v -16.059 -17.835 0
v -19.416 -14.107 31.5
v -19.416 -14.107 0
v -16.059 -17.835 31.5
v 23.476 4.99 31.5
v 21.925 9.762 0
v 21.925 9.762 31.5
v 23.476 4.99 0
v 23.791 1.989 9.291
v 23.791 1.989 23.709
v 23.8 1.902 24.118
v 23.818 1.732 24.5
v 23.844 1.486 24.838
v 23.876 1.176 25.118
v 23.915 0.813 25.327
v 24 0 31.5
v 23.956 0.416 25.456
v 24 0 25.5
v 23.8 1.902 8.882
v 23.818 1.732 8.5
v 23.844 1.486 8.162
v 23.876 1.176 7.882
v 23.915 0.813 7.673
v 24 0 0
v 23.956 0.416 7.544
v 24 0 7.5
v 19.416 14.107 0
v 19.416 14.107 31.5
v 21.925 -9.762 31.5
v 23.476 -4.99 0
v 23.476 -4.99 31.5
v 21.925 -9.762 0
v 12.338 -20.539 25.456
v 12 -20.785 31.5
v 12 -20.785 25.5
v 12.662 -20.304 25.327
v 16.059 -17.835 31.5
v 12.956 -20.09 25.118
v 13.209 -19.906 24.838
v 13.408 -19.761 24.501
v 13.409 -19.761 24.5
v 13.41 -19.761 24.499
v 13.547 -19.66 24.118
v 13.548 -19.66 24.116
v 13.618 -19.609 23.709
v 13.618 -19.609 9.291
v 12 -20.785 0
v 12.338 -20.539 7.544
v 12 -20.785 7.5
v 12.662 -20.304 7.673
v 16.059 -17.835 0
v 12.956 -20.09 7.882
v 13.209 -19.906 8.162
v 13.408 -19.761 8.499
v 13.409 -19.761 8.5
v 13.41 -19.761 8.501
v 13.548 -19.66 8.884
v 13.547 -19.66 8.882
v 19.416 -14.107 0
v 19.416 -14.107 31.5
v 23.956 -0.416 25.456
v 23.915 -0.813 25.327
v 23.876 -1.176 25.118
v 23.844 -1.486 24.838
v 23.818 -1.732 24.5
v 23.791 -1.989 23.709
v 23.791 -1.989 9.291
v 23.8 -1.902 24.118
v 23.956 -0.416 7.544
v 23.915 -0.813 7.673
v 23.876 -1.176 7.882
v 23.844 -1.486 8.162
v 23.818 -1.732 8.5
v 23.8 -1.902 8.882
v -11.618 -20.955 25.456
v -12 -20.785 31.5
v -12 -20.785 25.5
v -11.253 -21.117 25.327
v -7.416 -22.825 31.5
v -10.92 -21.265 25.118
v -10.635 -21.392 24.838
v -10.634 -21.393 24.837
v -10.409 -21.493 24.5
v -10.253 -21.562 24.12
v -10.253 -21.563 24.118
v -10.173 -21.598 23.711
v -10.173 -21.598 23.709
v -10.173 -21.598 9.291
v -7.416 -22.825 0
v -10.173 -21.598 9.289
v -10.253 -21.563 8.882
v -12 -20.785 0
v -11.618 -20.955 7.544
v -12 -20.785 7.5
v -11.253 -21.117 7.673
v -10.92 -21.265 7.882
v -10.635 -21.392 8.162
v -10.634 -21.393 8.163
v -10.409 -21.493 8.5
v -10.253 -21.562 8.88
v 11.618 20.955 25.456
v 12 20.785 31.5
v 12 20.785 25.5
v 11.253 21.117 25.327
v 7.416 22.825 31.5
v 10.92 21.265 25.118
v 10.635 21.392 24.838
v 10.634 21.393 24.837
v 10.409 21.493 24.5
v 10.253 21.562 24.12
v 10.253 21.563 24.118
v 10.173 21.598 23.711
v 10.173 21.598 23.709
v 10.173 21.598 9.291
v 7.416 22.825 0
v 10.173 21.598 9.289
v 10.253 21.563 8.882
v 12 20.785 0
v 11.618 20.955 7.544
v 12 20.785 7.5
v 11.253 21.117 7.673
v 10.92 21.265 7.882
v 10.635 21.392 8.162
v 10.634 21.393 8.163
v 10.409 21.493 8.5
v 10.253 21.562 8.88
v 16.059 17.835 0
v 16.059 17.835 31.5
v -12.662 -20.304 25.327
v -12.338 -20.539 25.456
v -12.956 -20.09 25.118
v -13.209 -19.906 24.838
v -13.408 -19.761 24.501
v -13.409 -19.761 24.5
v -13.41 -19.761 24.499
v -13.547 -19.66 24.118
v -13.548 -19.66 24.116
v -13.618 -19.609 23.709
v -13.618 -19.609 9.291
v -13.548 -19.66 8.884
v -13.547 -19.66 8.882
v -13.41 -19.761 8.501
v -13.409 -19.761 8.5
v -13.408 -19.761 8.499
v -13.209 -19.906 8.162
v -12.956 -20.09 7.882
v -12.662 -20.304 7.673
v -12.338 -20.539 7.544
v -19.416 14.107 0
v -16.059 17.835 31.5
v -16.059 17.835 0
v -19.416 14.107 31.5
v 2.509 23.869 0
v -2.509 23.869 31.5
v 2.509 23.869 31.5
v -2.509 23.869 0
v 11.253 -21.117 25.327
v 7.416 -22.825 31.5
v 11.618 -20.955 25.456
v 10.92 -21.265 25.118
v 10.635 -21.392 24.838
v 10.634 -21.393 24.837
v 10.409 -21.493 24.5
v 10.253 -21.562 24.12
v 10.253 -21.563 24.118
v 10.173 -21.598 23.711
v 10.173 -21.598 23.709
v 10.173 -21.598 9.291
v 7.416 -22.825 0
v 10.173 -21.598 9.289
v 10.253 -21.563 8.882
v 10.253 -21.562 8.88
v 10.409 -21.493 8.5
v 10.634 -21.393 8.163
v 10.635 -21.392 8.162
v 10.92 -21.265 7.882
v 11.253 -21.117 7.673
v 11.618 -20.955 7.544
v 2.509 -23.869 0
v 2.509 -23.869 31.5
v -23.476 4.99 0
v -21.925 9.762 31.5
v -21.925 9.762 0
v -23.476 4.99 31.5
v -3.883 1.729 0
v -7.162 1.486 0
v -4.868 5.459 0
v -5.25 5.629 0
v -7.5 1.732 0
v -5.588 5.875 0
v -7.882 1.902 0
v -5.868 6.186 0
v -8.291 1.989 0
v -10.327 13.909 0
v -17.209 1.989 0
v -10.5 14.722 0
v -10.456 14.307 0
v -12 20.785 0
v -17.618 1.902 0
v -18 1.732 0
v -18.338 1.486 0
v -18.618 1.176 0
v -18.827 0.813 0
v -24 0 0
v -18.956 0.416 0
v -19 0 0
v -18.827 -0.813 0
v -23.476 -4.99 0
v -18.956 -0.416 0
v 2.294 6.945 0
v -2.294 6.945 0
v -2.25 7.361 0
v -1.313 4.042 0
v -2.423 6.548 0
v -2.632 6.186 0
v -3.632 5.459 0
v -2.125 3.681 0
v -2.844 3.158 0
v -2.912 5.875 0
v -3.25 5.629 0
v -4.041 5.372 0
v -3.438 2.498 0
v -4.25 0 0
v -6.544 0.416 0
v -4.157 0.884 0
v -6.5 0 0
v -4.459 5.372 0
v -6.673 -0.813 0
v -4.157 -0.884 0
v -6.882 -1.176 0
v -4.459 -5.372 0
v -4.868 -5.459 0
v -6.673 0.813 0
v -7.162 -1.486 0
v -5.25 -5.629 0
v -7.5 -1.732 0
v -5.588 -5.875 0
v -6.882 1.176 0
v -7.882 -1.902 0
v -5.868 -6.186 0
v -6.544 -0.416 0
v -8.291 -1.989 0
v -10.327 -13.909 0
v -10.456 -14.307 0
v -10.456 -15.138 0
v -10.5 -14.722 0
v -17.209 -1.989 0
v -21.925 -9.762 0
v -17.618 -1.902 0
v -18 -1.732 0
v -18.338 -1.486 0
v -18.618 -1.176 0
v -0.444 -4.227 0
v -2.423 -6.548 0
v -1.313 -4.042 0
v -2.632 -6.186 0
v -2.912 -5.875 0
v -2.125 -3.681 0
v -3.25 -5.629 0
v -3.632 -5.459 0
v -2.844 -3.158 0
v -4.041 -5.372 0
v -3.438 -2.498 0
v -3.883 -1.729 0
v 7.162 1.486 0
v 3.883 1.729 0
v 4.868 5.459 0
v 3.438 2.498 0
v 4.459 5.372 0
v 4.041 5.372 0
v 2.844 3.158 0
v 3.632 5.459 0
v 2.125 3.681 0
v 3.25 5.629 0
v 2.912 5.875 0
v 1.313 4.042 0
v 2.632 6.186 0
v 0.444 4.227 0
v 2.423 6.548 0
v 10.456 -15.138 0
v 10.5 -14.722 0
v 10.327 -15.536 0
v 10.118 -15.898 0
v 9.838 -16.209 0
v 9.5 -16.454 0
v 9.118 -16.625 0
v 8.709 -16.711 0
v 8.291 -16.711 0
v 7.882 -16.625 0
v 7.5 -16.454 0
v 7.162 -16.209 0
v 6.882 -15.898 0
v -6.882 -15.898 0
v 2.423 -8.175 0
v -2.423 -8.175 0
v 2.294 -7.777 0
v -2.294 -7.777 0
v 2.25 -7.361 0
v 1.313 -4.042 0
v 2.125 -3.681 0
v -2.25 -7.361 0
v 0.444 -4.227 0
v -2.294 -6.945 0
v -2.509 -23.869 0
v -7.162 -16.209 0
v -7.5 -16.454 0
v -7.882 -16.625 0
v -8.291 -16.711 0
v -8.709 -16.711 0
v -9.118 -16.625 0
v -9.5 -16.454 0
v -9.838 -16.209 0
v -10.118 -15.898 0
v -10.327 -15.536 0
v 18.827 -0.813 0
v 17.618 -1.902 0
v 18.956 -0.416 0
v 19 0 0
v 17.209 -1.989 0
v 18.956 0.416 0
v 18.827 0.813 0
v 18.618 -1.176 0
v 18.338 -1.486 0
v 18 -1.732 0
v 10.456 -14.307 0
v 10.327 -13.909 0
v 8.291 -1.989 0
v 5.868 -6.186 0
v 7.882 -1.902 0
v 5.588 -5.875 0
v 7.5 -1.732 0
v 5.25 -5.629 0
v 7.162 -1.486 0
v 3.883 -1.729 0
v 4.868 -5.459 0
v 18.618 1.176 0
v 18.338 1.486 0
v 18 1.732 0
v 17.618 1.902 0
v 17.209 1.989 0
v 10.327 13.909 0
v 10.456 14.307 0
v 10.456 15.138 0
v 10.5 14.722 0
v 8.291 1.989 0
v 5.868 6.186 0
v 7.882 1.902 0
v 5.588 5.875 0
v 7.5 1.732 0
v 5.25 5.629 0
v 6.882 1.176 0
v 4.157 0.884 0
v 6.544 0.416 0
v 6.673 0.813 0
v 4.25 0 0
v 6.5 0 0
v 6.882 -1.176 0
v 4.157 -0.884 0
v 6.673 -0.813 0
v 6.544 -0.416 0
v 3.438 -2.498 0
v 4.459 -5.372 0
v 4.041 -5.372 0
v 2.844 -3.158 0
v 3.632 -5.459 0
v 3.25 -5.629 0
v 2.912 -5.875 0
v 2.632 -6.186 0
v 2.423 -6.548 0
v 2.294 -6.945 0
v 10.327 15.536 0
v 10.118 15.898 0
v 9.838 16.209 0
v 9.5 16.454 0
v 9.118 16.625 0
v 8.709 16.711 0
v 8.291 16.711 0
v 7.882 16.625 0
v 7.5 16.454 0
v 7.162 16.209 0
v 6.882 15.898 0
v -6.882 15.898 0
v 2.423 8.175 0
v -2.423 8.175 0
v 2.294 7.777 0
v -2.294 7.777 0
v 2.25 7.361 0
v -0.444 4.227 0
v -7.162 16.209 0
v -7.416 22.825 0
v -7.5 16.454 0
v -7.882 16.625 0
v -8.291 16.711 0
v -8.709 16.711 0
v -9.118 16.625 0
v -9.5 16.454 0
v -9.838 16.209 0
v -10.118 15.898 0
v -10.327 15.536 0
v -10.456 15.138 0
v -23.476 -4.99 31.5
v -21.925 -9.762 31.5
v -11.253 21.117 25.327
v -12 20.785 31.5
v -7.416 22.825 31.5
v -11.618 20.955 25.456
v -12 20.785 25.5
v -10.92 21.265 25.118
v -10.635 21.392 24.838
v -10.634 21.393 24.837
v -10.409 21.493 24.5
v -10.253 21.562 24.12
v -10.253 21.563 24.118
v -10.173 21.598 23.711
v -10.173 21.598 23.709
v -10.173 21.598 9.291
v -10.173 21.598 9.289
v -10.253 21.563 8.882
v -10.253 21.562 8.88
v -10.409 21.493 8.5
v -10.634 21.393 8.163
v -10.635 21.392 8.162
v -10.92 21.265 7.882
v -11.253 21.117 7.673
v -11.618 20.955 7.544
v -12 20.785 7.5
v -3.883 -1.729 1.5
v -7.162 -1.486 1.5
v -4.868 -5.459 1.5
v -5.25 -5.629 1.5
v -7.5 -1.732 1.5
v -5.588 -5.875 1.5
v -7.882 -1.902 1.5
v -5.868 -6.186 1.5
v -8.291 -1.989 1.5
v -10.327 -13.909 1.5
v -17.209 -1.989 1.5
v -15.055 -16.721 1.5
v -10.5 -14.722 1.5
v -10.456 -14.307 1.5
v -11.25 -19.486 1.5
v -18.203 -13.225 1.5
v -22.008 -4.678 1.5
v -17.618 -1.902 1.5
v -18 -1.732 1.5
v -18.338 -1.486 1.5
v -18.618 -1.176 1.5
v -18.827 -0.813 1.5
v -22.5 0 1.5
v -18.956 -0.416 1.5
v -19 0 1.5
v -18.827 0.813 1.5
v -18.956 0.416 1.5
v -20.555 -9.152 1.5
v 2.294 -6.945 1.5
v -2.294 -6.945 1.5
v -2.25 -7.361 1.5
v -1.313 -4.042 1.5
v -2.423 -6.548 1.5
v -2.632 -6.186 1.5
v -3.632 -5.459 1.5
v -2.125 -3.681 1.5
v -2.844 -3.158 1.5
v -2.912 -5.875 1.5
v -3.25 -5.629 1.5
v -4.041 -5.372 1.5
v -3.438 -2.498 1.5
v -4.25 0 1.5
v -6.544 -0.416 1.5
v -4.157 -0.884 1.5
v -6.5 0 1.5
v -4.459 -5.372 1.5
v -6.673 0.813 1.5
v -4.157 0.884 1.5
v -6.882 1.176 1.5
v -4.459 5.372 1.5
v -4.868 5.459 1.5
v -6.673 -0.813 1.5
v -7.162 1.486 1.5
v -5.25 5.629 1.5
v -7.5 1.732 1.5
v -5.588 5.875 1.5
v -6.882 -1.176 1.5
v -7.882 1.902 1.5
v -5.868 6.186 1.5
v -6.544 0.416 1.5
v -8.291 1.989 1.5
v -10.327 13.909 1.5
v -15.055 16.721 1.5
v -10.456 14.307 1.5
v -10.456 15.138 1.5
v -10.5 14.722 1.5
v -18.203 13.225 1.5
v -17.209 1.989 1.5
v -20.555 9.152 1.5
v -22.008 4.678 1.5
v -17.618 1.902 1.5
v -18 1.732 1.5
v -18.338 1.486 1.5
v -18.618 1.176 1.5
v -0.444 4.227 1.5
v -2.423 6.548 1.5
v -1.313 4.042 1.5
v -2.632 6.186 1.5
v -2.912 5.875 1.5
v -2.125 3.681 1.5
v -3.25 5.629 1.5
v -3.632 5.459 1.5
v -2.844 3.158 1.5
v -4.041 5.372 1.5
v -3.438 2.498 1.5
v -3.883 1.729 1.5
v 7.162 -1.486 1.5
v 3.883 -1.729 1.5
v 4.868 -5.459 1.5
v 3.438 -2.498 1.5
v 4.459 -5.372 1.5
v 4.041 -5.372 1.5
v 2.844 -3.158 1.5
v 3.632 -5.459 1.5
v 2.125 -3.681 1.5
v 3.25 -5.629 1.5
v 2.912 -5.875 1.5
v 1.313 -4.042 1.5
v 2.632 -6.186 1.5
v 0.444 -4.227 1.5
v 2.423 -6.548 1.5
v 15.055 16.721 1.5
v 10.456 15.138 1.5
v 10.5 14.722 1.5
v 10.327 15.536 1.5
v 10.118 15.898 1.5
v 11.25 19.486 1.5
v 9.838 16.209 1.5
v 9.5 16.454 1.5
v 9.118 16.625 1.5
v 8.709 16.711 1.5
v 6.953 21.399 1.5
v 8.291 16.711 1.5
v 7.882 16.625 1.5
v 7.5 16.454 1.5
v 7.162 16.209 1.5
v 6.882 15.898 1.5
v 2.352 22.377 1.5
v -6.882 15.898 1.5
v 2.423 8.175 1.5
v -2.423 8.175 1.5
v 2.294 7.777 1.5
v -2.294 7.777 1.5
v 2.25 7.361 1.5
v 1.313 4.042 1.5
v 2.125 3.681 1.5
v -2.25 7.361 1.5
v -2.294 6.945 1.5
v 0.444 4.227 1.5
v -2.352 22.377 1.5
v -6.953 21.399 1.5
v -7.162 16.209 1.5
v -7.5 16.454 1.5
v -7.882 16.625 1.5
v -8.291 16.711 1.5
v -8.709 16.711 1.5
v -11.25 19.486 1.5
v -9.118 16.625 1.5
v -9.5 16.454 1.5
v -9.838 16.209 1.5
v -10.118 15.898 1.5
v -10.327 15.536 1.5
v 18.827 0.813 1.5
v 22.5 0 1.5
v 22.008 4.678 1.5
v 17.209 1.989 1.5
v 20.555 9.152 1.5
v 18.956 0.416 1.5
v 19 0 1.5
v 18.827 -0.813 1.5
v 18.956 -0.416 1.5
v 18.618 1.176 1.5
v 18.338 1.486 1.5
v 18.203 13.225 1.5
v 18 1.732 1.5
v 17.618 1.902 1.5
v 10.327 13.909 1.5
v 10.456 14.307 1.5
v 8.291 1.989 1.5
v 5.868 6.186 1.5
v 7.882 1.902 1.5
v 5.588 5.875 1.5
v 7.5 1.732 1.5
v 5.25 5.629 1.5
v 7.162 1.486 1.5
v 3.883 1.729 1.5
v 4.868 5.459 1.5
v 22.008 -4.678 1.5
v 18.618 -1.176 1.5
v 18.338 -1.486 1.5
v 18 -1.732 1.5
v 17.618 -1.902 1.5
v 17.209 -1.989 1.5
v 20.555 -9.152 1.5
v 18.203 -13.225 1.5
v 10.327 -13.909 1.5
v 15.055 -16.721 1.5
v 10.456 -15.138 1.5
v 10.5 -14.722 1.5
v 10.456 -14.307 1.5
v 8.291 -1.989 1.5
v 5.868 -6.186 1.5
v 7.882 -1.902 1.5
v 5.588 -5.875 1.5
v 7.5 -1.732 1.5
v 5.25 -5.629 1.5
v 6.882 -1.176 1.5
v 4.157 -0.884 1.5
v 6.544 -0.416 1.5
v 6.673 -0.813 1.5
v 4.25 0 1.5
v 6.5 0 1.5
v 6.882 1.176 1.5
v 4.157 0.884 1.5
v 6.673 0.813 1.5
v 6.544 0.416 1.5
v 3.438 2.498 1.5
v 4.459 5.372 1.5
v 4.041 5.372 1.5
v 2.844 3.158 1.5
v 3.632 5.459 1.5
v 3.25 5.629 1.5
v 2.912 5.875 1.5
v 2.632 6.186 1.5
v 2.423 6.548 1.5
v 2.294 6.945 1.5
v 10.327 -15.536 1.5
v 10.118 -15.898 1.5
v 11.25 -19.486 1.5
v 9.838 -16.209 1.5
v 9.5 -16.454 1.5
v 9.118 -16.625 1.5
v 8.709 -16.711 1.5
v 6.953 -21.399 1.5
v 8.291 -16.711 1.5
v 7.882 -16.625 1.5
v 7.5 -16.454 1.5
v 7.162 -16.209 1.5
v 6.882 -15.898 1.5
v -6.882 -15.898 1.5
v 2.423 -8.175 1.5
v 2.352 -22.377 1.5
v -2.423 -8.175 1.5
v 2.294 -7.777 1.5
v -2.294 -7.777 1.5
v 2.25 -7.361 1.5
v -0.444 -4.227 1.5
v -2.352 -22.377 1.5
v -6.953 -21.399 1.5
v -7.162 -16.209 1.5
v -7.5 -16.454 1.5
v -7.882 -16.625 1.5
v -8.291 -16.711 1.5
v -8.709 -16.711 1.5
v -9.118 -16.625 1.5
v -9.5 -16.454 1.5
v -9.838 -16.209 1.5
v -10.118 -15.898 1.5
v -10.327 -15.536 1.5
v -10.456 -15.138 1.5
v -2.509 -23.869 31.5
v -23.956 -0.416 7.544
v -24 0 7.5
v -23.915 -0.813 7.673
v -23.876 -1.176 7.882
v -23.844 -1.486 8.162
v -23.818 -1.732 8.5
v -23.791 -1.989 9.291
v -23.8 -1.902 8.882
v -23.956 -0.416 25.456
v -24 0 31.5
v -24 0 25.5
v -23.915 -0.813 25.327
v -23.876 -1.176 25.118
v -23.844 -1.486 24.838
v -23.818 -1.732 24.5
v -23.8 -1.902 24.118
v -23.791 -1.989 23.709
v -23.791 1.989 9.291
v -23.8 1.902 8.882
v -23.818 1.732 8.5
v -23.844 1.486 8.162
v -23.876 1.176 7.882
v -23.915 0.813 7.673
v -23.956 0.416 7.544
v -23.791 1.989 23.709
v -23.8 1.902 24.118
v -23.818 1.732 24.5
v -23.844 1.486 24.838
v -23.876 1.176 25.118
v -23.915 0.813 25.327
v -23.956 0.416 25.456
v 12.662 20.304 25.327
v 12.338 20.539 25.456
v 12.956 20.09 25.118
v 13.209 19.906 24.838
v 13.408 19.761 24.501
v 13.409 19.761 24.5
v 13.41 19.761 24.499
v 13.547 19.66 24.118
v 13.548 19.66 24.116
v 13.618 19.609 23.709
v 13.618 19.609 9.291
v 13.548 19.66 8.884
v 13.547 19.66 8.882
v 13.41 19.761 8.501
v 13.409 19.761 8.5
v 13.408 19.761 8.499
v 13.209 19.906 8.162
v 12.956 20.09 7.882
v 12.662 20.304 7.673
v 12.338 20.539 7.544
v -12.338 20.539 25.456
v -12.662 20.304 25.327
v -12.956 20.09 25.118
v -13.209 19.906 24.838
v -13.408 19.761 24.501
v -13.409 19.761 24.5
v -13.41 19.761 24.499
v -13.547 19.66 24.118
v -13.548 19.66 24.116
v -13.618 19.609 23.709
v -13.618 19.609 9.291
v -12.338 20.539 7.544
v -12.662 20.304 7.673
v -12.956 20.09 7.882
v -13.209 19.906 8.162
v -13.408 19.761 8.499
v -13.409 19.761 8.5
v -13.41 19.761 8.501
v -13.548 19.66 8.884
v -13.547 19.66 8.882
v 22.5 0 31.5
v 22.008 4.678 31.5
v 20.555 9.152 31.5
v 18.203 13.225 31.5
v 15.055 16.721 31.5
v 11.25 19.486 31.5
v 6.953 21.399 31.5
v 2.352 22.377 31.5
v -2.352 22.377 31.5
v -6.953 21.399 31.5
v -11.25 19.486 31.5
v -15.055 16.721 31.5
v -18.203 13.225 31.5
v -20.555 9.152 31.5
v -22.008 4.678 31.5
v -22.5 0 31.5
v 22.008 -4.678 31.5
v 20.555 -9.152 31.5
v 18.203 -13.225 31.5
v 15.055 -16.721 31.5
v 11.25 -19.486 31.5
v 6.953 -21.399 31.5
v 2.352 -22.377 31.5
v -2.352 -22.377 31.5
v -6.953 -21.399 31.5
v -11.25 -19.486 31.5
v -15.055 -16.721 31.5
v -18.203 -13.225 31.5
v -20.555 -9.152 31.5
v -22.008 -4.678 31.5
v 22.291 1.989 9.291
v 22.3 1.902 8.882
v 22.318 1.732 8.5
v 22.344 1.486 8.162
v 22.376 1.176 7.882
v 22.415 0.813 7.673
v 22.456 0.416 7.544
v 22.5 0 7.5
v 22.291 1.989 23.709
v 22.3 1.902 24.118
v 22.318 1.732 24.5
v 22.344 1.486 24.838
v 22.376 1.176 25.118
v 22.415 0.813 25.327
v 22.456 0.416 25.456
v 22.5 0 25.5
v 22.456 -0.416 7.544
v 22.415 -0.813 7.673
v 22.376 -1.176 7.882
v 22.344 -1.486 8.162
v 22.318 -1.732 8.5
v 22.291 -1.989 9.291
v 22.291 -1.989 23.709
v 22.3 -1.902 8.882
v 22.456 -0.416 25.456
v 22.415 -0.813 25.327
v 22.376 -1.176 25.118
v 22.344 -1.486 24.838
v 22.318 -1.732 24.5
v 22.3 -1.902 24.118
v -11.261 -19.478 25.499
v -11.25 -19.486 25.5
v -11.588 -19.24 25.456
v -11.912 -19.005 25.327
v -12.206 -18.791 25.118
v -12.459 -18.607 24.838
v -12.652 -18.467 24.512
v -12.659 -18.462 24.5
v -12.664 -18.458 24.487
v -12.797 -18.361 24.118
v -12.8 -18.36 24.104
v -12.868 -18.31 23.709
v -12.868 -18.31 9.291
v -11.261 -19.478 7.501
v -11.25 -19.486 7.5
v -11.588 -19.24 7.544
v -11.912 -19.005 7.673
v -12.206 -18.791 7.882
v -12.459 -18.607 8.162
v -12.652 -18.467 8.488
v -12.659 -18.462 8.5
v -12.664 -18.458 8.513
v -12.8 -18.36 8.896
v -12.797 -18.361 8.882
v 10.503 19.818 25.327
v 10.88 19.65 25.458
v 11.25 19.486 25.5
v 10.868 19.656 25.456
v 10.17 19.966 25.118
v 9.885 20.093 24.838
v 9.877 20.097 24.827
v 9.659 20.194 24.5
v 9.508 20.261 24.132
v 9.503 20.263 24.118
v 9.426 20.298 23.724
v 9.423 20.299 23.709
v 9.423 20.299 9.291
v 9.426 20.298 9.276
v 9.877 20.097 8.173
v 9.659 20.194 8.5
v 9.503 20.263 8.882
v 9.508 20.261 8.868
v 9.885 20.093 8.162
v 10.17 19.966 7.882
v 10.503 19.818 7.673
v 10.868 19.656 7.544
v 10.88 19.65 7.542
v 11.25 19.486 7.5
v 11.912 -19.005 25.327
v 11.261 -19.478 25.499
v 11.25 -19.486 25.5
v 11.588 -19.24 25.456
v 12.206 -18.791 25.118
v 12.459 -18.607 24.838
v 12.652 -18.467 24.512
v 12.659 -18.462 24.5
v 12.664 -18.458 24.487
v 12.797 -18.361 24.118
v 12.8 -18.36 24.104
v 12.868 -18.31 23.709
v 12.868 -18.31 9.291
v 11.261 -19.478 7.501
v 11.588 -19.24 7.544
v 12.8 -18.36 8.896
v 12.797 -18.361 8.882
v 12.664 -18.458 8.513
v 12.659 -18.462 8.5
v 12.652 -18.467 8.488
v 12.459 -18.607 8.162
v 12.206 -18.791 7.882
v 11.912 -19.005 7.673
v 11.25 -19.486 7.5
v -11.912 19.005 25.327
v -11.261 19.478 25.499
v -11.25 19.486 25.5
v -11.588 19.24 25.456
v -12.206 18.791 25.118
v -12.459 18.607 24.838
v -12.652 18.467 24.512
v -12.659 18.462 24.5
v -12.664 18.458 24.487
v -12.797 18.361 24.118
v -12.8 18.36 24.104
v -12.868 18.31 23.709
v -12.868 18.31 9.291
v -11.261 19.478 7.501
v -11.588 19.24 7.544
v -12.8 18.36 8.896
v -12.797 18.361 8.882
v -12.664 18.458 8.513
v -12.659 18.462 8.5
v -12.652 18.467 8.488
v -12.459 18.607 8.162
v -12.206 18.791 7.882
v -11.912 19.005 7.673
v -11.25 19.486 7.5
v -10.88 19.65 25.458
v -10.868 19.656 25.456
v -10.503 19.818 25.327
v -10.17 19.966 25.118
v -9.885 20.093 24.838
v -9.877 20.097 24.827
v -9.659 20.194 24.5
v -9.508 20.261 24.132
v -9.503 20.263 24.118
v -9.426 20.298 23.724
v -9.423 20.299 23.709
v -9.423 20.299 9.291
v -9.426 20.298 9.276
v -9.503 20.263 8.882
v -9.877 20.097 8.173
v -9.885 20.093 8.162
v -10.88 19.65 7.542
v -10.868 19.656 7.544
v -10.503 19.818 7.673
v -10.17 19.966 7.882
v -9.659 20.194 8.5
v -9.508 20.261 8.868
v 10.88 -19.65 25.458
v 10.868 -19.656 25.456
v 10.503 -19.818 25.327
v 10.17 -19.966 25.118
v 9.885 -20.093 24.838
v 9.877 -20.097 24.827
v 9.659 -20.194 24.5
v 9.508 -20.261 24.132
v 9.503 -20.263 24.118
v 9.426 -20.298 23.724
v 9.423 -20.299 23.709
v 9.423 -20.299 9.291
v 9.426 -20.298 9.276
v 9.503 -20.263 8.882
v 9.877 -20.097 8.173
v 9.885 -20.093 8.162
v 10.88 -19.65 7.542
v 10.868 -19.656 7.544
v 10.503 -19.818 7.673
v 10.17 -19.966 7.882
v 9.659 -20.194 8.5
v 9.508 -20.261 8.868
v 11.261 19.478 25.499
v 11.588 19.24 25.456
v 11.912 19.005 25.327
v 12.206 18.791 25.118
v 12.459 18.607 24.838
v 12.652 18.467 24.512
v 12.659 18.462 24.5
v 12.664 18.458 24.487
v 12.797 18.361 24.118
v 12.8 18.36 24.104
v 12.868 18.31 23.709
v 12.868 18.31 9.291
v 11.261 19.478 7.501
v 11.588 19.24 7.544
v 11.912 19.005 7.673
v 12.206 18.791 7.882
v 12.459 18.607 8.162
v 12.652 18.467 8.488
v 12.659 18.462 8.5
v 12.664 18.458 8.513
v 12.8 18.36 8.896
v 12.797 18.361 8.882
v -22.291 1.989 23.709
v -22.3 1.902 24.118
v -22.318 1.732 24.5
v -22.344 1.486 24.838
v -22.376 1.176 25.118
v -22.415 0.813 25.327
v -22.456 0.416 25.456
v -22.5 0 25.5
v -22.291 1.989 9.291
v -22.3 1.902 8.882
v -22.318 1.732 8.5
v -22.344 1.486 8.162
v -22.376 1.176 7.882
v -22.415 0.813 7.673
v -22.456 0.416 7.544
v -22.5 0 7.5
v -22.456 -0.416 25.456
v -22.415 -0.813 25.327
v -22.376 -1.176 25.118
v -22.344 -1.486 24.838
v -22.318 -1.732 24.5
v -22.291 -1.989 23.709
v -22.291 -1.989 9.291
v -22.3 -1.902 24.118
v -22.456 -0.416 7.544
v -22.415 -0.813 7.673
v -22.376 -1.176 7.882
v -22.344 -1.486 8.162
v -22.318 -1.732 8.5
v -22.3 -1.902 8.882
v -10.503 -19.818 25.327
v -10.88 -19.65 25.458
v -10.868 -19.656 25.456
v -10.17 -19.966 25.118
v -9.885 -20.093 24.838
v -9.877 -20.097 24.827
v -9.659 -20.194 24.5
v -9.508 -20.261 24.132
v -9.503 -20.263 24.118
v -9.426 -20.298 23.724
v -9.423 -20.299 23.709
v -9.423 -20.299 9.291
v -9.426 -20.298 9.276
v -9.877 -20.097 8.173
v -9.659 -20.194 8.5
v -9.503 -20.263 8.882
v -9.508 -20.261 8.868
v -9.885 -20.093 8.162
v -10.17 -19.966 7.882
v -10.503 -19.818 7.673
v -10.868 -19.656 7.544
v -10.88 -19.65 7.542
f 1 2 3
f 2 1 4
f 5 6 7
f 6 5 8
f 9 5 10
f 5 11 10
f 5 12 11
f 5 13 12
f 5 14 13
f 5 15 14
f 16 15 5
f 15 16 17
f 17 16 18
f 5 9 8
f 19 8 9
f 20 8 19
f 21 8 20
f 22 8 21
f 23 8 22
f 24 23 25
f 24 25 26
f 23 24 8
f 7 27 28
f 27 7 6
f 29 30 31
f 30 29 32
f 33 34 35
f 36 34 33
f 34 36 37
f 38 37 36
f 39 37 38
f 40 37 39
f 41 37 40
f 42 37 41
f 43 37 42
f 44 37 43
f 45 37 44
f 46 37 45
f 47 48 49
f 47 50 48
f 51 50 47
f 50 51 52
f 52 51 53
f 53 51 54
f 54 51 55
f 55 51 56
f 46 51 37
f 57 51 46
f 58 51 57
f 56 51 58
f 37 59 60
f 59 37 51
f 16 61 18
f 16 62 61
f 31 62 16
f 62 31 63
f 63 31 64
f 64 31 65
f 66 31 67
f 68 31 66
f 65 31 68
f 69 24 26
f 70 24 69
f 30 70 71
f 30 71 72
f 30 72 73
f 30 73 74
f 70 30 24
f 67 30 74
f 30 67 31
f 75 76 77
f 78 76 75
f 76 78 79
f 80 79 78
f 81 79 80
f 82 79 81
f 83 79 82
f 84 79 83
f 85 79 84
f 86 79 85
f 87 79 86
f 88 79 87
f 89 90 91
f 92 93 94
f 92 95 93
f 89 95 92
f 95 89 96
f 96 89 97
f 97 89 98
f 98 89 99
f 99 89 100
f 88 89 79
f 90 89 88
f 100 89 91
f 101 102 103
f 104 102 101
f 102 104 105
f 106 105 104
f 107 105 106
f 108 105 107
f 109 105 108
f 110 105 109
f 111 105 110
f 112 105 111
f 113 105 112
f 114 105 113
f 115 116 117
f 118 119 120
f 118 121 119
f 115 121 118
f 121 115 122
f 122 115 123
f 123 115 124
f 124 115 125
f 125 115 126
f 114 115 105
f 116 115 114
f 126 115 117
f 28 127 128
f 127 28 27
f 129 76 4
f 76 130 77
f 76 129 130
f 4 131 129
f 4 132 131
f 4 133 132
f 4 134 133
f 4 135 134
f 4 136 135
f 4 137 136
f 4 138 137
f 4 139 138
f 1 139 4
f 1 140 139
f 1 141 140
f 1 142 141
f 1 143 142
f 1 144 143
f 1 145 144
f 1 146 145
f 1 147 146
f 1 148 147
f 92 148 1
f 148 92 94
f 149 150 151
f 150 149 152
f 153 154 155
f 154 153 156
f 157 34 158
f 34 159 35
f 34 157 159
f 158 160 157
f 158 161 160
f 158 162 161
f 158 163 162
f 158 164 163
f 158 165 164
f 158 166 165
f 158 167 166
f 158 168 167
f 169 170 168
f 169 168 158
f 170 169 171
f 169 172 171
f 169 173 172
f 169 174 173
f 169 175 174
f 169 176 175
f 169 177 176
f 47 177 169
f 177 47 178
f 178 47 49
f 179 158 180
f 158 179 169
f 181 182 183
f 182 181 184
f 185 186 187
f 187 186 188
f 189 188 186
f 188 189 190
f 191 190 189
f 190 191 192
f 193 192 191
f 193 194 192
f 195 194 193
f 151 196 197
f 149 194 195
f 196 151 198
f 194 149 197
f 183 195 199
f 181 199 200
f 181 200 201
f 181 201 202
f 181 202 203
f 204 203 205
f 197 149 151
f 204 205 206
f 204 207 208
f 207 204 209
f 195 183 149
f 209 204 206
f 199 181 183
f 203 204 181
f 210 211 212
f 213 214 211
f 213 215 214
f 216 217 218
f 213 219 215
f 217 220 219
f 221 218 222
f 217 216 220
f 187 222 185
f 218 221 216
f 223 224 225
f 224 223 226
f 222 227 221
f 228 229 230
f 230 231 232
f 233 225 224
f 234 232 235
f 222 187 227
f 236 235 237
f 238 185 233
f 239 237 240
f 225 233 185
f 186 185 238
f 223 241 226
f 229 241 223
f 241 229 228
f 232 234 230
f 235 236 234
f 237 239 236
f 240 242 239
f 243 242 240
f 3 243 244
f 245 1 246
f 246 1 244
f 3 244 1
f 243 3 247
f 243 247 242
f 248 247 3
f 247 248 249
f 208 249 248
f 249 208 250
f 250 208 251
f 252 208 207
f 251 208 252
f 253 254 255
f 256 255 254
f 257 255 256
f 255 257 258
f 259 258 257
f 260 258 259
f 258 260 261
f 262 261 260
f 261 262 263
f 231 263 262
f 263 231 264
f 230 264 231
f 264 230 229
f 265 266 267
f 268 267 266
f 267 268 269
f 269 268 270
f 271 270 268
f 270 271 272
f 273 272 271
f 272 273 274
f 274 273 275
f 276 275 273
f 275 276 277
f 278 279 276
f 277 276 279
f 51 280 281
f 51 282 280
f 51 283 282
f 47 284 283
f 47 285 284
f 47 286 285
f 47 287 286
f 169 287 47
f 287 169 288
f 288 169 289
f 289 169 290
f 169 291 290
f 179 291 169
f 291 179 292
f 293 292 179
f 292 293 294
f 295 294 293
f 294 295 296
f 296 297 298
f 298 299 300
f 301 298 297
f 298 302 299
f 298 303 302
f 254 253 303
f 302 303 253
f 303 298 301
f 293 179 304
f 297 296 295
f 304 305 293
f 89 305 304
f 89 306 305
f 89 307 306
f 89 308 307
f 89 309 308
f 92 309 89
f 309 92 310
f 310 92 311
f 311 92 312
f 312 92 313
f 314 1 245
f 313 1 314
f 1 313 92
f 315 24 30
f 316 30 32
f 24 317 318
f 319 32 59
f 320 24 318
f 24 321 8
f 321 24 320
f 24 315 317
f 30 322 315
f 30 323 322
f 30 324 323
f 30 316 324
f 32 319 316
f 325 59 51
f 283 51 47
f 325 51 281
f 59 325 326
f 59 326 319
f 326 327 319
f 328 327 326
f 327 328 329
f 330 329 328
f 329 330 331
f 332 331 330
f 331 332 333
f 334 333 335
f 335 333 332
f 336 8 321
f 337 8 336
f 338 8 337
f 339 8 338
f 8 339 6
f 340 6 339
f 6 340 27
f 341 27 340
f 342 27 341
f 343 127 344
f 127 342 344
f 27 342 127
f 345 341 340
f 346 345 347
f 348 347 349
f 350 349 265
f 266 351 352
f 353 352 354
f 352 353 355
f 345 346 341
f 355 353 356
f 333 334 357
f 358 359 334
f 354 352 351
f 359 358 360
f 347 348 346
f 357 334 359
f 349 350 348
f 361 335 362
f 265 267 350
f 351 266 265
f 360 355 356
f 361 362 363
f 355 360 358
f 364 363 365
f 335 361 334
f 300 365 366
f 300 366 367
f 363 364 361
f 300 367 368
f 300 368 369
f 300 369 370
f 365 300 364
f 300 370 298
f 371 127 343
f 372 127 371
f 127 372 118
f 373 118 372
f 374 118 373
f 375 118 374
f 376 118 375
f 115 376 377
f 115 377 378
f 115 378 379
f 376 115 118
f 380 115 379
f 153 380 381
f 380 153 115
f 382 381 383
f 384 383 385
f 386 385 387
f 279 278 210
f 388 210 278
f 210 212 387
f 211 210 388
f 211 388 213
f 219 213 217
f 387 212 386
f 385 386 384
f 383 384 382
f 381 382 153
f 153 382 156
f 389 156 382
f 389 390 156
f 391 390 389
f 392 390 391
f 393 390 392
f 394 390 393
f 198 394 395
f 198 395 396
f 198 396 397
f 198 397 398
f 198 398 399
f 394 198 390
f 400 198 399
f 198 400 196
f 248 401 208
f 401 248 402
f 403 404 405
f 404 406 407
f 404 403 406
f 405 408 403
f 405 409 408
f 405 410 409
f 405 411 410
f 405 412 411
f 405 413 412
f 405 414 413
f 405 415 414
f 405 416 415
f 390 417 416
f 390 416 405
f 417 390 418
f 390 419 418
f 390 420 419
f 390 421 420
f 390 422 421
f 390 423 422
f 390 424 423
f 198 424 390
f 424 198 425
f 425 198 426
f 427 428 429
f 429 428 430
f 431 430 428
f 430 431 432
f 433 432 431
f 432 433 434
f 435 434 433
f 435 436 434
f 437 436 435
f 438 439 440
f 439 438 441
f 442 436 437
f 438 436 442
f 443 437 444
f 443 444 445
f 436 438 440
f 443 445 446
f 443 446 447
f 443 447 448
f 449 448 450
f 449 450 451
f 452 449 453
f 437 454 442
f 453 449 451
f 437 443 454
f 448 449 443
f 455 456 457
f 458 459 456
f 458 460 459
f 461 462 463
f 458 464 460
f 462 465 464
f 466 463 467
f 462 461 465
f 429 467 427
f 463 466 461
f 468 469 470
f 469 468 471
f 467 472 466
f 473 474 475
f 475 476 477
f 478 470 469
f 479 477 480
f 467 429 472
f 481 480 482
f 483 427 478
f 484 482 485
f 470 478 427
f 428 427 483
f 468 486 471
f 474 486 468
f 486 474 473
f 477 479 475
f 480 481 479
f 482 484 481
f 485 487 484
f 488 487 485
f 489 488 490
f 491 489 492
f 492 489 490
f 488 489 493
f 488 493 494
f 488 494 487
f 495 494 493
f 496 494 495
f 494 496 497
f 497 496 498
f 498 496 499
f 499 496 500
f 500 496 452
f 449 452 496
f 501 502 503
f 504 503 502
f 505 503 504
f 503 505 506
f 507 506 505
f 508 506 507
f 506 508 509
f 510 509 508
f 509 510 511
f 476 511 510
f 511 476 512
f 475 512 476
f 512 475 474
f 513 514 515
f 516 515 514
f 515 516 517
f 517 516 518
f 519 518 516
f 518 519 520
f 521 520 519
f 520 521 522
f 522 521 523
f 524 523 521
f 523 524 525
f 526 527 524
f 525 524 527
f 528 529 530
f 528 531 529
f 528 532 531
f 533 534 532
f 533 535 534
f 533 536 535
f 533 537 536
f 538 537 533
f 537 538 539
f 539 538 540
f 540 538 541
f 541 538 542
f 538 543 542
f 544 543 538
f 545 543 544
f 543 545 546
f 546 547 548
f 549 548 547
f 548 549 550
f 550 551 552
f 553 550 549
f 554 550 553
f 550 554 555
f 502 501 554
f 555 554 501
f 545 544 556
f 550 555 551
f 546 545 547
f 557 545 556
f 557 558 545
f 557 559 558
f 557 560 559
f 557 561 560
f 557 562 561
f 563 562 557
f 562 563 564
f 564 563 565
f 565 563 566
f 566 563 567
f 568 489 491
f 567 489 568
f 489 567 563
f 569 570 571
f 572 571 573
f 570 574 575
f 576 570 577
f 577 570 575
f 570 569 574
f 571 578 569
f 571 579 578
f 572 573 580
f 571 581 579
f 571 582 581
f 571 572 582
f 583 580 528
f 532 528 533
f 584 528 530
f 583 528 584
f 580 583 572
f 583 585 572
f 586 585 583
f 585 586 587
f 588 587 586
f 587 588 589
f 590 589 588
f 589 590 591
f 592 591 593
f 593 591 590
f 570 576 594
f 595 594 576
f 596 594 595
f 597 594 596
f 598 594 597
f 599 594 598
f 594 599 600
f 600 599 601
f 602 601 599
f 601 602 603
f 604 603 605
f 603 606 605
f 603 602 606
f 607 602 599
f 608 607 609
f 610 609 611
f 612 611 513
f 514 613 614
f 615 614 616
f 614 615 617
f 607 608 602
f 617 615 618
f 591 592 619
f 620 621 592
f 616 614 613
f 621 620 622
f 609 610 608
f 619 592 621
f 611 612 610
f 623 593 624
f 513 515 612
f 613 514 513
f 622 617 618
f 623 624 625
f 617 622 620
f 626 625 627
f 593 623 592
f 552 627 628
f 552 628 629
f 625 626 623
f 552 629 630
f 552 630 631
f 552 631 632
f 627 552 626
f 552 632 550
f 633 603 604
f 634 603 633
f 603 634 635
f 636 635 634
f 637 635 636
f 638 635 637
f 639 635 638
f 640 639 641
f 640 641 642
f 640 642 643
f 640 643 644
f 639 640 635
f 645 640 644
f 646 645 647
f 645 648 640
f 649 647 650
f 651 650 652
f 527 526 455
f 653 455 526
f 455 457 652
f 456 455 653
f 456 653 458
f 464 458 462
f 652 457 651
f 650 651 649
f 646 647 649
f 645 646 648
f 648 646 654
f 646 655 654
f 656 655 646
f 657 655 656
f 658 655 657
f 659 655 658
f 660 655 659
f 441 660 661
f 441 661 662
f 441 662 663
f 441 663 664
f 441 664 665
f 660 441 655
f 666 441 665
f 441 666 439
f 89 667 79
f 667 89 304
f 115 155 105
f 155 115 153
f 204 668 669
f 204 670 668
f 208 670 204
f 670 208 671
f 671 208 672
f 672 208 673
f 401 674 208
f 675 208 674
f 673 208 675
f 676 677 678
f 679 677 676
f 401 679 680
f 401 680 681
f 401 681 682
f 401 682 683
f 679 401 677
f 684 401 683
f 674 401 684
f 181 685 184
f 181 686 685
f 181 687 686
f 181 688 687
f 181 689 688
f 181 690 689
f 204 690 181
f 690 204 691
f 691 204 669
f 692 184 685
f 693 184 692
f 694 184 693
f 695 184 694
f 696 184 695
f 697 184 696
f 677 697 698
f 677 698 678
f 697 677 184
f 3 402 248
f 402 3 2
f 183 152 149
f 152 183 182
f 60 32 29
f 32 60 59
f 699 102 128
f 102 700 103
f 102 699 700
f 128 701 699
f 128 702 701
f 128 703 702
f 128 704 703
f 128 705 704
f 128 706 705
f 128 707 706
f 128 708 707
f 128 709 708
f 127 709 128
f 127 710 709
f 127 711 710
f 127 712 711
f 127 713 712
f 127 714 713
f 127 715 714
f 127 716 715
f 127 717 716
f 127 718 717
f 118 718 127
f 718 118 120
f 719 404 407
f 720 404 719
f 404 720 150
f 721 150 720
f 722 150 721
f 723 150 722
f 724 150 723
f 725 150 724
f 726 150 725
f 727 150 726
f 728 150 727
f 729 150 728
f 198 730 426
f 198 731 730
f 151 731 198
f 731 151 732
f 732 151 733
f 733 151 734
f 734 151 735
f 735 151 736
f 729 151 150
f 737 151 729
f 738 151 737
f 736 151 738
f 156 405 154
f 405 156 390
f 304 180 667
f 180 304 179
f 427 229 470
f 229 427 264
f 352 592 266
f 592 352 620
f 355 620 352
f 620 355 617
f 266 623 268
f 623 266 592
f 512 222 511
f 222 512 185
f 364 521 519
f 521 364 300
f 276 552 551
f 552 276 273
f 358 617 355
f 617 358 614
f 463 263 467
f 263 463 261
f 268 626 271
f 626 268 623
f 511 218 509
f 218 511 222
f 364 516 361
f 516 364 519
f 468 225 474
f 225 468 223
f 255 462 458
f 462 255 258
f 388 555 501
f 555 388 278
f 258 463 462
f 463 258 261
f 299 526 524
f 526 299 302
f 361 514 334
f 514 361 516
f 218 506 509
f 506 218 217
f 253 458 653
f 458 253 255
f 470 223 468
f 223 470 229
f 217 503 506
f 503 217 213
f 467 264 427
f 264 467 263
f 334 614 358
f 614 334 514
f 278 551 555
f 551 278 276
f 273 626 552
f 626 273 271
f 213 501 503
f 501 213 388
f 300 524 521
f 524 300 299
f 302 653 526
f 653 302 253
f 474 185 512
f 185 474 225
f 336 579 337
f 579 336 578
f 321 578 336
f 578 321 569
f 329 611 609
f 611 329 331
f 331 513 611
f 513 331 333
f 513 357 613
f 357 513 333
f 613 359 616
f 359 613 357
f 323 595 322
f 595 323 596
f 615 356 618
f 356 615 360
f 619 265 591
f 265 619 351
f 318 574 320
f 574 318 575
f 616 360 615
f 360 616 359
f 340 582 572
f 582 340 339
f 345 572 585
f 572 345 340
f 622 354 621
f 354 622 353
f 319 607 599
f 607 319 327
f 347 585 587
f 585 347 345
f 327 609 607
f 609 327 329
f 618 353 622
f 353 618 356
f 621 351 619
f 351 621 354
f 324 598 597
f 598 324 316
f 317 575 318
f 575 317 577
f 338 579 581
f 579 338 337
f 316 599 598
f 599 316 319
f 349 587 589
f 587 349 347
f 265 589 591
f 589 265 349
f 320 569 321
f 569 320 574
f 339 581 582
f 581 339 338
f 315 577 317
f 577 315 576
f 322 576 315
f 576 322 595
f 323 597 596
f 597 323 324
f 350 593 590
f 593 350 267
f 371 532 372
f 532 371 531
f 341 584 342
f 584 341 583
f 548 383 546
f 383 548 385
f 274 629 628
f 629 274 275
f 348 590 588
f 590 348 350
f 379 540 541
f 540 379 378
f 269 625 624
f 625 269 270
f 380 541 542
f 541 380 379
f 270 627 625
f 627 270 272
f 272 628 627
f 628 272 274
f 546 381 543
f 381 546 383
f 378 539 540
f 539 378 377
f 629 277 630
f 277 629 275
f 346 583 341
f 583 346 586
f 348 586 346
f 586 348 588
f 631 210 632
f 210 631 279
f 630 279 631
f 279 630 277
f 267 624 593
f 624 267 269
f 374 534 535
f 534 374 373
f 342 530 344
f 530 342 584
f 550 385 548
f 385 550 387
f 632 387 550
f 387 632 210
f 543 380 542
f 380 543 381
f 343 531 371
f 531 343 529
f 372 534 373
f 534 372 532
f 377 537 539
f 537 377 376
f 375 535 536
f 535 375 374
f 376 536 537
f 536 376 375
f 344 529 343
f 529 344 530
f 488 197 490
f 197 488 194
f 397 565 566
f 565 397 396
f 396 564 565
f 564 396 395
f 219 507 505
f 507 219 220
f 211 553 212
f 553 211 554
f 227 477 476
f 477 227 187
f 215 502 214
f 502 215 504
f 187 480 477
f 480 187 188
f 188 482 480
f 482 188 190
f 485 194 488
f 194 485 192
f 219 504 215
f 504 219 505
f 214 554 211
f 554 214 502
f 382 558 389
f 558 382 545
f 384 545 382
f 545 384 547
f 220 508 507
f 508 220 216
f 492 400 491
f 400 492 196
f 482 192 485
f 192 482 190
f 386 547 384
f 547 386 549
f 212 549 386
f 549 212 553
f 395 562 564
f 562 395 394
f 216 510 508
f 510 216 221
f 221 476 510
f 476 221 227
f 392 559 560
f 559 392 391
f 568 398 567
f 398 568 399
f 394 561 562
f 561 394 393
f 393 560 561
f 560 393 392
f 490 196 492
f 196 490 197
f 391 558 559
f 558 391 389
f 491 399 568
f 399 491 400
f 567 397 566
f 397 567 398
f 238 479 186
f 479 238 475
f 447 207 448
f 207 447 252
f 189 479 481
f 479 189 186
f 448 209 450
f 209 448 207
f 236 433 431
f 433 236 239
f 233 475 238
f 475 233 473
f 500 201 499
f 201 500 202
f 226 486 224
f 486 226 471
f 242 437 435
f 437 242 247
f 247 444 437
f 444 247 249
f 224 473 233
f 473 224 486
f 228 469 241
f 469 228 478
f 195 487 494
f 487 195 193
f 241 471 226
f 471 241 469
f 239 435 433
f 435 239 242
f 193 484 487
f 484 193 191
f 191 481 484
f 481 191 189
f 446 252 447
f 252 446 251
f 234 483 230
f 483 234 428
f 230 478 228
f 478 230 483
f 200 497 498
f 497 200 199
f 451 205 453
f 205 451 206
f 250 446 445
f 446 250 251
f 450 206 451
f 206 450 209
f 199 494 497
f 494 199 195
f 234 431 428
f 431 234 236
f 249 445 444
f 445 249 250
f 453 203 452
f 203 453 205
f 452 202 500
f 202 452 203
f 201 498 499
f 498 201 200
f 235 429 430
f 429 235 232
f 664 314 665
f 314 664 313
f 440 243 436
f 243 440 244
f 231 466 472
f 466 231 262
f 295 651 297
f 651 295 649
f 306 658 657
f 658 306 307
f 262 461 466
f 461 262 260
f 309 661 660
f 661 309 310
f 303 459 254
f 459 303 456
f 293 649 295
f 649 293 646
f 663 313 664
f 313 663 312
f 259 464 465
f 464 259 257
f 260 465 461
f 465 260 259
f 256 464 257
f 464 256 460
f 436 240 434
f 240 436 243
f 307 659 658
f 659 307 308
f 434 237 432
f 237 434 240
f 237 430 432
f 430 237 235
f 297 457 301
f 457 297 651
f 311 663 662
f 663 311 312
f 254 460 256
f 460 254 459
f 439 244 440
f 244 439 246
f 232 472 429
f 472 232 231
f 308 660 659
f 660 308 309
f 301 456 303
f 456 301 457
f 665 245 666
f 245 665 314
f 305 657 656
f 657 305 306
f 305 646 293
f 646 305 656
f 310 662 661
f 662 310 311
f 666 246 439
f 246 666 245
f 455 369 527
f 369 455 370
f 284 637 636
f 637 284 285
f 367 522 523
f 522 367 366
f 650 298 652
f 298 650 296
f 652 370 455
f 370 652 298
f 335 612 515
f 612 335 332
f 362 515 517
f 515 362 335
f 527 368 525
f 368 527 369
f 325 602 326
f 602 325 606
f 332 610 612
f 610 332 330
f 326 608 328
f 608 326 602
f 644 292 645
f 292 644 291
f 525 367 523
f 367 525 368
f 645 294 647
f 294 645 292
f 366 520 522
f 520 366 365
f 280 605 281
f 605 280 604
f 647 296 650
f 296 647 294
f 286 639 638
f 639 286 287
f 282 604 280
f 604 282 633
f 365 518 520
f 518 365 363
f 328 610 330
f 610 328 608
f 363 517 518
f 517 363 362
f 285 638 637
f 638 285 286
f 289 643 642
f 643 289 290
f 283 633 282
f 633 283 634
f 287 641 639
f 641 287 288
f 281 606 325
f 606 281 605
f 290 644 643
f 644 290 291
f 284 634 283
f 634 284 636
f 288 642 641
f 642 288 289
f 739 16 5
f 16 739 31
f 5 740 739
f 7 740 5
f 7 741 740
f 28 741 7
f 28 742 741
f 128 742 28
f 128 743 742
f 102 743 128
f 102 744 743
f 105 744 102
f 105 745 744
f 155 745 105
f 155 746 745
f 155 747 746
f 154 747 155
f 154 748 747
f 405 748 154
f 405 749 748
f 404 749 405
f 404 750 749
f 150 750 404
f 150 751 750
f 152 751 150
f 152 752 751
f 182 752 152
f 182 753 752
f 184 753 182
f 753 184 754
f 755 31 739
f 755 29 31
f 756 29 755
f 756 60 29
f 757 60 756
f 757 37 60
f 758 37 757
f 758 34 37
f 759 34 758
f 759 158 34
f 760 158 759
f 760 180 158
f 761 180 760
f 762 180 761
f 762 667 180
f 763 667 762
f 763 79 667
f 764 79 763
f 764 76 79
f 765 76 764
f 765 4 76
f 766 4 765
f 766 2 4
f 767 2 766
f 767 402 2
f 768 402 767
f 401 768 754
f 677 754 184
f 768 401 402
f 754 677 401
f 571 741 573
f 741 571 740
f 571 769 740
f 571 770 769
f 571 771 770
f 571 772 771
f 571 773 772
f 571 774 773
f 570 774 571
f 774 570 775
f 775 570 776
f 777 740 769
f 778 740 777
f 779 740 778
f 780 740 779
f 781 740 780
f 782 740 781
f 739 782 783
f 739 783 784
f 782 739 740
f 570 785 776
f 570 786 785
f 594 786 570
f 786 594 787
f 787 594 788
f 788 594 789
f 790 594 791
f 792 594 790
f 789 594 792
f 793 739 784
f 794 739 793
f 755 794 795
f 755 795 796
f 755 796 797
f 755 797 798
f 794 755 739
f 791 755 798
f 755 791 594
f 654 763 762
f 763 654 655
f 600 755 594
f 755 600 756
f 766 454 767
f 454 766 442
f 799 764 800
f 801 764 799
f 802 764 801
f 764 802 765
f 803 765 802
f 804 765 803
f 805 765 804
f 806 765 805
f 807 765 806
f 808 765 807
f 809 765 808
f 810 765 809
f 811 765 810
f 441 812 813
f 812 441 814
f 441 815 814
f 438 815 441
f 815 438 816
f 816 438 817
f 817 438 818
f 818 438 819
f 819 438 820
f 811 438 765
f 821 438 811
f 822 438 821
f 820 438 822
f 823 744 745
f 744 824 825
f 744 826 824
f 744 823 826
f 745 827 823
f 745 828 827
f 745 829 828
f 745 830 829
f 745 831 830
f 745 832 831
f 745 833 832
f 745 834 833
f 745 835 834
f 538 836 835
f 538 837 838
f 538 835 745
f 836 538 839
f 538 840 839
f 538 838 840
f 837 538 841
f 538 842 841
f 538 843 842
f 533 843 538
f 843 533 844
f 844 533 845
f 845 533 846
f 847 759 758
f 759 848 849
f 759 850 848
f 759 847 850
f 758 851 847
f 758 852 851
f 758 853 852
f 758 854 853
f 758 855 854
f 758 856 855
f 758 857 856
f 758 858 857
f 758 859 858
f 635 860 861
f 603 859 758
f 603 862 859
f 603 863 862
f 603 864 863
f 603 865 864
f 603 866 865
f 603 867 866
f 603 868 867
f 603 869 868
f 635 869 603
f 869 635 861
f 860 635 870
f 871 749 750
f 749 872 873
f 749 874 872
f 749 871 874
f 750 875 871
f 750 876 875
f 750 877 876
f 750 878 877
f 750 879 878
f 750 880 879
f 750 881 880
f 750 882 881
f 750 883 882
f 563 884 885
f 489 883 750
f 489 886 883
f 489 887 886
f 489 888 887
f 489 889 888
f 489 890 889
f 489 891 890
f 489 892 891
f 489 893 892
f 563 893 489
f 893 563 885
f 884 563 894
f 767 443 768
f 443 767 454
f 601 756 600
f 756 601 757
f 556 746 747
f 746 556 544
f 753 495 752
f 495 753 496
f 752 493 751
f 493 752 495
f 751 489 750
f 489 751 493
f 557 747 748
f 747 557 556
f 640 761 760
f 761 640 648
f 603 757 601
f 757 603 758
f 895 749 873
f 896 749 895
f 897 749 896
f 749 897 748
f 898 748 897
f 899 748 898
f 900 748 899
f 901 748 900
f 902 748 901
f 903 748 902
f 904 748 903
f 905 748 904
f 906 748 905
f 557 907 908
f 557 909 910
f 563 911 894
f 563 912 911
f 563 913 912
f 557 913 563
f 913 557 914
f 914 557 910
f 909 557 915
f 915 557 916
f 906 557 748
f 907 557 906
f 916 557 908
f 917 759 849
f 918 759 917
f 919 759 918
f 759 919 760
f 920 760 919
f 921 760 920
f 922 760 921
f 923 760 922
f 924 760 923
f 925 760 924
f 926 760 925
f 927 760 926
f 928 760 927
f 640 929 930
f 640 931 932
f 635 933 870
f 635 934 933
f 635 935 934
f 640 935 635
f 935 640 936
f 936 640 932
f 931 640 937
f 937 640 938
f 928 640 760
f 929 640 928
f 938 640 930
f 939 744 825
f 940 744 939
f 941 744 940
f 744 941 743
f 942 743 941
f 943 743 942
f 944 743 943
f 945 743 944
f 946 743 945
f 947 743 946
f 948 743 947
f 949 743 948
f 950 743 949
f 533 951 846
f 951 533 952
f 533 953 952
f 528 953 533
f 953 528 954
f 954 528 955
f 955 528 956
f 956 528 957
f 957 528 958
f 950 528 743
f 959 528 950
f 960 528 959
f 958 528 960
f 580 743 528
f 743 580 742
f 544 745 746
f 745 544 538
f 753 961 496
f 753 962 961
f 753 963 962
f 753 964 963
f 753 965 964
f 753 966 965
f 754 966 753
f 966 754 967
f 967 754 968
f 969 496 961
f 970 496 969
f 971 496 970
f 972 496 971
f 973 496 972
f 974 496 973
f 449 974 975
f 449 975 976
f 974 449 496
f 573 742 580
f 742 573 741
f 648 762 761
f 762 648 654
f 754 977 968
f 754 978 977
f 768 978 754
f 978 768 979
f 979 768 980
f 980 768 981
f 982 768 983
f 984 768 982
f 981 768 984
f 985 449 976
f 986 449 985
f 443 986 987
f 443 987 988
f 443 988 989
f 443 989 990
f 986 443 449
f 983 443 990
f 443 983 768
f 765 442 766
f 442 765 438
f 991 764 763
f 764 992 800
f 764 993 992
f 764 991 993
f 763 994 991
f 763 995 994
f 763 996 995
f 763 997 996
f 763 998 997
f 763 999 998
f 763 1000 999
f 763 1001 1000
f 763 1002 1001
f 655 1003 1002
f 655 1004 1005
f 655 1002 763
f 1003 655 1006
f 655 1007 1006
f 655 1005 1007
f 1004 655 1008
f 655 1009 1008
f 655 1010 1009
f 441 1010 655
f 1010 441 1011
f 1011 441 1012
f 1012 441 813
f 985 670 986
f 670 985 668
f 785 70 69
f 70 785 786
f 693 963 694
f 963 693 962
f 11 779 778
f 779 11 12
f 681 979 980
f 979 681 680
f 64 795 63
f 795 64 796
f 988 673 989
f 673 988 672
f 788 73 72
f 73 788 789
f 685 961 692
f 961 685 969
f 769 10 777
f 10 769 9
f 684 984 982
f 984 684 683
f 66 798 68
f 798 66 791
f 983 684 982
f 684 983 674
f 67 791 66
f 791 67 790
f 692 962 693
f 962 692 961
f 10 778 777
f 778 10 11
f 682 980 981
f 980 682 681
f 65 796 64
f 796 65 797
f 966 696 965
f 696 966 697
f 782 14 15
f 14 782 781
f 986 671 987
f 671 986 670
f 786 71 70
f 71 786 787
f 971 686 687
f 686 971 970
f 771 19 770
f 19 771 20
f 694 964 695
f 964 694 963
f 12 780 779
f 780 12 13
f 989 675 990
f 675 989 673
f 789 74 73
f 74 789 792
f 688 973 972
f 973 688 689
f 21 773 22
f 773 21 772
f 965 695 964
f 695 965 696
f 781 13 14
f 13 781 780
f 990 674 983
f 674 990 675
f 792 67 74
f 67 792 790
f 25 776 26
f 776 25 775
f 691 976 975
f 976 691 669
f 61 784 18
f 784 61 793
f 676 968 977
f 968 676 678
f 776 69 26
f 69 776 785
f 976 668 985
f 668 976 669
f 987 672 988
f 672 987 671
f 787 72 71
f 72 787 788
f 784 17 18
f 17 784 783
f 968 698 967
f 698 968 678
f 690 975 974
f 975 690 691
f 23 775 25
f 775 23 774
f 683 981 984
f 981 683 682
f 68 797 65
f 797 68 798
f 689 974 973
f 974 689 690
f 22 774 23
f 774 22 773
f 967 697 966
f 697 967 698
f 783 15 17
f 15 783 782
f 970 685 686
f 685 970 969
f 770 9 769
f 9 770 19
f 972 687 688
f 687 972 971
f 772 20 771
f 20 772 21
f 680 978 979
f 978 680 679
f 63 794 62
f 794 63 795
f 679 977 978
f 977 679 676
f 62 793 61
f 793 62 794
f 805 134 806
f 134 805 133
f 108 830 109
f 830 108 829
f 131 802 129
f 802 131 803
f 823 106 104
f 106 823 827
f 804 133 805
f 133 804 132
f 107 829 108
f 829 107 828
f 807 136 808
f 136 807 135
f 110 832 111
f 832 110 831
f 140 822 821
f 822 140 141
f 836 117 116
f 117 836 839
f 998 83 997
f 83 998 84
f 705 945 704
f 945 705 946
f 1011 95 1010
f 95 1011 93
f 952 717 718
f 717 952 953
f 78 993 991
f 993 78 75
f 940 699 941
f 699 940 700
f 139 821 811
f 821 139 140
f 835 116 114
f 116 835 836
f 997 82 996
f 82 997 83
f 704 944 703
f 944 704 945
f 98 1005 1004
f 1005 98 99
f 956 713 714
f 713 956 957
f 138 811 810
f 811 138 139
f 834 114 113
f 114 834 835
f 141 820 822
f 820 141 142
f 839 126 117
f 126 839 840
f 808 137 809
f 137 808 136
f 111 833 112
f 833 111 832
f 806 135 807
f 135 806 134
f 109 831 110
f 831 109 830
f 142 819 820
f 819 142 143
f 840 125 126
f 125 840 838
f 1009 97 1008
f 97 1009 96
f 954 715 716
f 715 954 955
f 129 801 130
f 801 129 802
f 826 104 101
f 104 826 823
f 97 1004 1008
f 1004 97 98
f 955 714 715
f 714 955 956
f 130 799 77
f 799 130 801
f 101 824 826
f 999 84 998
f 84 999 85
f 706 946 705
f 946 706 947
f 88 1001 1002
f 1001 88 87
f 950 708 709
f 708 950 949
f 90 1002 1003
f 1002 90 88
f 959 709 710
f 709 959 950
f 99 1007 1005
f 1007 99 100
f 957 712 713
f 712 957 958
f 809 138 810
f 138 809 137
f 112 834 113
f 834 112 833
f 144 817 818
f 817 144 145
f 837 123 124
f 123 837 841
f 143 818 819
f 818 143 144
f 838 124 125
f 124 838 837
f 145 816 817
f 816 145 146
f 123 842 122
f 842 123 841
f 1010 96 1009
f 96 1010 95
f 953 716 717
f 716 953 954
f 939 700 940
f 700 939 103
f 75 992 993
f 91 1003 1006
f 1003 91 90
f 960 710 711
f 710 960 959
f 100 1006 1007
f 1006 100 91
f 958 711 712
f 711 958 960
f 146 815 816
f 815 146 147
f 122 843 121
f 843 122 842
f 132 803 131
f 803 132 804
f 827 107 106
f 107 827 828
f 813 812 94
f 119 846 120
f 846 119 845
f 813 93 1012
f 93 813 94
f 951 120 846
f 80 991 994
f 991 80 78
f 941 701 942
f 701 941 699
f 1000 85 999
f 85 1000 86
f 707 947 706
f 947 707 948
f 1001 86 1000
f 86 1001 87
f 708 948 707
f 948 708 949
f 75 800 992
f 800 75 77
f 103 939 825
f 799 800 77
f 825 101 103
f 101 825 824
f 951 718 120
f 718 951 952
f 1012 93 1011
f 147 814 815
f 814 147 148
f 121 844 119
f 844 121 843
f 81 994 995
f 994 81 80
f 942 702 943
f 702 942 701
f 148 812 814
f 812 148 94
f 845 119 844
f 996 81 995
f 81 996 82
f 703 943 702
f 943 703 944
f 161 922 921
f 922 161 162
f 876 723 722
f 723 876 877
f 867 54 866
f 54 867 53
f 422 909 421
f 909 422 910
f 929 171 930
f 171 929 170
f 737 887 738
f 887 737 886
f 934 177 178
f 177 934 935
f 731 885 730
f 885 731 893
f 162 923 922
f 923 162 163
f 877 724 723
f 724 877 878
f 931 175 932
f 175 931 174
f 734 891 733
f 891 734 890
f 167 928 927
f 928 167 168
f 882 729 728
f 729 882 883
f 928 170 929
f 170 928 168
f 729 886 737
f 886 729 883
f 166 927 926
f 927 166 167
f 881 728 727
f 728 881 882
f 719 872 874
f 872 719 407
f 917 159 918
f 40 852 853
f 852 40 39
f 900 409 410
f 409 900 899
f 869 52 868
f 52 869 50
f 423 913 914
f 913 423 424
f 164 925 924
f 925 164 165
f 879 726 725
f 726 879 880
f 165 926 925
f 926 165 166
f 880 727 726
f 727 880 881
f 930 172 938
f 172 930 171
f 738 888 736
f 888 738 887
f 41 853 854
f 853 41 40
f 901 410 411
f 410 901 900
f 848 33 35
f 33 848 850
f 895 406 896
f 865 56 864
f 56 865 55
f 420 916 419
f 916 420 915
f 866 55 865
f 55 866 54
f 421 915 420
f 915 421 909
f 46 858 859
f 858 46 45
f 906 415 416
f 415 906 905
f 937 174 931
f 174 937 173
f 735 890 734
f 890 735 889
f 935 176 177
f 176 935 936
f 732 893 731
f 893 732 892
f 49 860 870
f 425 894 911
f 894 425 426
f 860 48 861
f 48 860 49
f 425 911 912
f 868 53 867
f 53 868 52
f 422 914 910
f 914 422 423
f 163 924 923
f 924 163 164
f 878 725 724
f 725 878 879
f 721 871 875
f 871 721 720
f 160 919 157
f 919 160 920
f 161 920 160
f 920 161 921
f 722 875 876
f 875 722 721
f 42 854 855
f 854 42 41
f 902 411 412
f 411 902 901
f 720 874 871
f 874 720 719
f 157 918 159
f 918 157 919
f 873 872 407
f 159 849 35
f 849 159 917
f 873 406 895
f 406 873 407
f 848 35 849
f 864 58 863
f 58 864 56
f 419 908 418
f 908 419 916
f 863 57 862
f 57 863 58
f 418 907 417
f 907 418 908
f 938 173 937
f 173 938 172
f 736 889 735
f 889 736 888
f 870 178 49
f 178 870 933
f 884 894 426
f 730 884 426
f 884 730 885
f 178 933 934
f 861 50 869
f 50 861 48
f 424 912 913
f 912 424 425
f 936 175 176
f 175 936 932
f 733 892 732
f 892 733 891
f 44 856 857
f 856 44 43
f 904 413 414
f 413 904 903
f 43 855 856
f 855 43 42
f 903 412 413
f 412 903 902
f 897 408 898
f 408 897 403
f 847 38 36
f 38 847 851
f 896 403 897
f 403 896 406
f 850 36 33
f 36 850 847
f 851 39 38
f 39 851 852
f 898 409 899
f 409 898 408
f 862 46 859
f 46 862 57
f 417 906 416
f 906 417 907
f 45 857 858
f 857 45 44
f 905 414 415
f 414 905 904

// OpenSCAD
$fn = 30;

prumerMotoru = 45;
prumerTyce = 8.5;
vyska = 30;
stena = 1.5;

module diraBok() {
    rotate([0, 90, 0]) hull() {
        translate([-vyska/2+8, 0, 0]) cylinder(r=2, h=prumerMotoru+stena*2, center=true);
        translate([vyska/2-8, 0, 0]) cylinder(r=2, h=prumerMotoru+stena*2, center=true);
    }
}

module diraDno() {
    hull() {
        translate([prumerTyce, 0, 0]) cylinder(r=2, h=stena);
        translate([prumerMotoru/2-stena-4, 0, 0]) cylinder(r=2, h=stena);
    }
}

module ring() {
    difference() {
        cylinder(r=prumerMotoru/2+stena, h=vyska);
        cylinder(r=prumerMotoru/2, h=vyska);
        #rotate([0, 0, 0]) translate([0, 0, vyska/2]) diraBok();
        #rotate([0, 0, 60]) translate([0, 0, vyska/2]) diraBok();
        #rotate([0, 0, 120]) translate([0, 0, vyska/2]) diraBok();
    }
}
module bottom() {
    difference() {
        cylinder(r=prumerMotoru/2+stena, h=stena);
        cylinder(r=prumerTyce/2, h=stena);
        #rotate([0, 0, 0]) diraDno();
        #rotate([0, 0, 60]) diraDno();
        #rotate([0, 0, 120]) diraDno();
        #rotate([0, 0, 120+60]) diraDno();
        #rotate([0, 0, 240]) diraDno();
        #rotate([0, 0, 240+60]) diraDno();
    }
}



bottom();
translate([0, 0, stena]) ring();
